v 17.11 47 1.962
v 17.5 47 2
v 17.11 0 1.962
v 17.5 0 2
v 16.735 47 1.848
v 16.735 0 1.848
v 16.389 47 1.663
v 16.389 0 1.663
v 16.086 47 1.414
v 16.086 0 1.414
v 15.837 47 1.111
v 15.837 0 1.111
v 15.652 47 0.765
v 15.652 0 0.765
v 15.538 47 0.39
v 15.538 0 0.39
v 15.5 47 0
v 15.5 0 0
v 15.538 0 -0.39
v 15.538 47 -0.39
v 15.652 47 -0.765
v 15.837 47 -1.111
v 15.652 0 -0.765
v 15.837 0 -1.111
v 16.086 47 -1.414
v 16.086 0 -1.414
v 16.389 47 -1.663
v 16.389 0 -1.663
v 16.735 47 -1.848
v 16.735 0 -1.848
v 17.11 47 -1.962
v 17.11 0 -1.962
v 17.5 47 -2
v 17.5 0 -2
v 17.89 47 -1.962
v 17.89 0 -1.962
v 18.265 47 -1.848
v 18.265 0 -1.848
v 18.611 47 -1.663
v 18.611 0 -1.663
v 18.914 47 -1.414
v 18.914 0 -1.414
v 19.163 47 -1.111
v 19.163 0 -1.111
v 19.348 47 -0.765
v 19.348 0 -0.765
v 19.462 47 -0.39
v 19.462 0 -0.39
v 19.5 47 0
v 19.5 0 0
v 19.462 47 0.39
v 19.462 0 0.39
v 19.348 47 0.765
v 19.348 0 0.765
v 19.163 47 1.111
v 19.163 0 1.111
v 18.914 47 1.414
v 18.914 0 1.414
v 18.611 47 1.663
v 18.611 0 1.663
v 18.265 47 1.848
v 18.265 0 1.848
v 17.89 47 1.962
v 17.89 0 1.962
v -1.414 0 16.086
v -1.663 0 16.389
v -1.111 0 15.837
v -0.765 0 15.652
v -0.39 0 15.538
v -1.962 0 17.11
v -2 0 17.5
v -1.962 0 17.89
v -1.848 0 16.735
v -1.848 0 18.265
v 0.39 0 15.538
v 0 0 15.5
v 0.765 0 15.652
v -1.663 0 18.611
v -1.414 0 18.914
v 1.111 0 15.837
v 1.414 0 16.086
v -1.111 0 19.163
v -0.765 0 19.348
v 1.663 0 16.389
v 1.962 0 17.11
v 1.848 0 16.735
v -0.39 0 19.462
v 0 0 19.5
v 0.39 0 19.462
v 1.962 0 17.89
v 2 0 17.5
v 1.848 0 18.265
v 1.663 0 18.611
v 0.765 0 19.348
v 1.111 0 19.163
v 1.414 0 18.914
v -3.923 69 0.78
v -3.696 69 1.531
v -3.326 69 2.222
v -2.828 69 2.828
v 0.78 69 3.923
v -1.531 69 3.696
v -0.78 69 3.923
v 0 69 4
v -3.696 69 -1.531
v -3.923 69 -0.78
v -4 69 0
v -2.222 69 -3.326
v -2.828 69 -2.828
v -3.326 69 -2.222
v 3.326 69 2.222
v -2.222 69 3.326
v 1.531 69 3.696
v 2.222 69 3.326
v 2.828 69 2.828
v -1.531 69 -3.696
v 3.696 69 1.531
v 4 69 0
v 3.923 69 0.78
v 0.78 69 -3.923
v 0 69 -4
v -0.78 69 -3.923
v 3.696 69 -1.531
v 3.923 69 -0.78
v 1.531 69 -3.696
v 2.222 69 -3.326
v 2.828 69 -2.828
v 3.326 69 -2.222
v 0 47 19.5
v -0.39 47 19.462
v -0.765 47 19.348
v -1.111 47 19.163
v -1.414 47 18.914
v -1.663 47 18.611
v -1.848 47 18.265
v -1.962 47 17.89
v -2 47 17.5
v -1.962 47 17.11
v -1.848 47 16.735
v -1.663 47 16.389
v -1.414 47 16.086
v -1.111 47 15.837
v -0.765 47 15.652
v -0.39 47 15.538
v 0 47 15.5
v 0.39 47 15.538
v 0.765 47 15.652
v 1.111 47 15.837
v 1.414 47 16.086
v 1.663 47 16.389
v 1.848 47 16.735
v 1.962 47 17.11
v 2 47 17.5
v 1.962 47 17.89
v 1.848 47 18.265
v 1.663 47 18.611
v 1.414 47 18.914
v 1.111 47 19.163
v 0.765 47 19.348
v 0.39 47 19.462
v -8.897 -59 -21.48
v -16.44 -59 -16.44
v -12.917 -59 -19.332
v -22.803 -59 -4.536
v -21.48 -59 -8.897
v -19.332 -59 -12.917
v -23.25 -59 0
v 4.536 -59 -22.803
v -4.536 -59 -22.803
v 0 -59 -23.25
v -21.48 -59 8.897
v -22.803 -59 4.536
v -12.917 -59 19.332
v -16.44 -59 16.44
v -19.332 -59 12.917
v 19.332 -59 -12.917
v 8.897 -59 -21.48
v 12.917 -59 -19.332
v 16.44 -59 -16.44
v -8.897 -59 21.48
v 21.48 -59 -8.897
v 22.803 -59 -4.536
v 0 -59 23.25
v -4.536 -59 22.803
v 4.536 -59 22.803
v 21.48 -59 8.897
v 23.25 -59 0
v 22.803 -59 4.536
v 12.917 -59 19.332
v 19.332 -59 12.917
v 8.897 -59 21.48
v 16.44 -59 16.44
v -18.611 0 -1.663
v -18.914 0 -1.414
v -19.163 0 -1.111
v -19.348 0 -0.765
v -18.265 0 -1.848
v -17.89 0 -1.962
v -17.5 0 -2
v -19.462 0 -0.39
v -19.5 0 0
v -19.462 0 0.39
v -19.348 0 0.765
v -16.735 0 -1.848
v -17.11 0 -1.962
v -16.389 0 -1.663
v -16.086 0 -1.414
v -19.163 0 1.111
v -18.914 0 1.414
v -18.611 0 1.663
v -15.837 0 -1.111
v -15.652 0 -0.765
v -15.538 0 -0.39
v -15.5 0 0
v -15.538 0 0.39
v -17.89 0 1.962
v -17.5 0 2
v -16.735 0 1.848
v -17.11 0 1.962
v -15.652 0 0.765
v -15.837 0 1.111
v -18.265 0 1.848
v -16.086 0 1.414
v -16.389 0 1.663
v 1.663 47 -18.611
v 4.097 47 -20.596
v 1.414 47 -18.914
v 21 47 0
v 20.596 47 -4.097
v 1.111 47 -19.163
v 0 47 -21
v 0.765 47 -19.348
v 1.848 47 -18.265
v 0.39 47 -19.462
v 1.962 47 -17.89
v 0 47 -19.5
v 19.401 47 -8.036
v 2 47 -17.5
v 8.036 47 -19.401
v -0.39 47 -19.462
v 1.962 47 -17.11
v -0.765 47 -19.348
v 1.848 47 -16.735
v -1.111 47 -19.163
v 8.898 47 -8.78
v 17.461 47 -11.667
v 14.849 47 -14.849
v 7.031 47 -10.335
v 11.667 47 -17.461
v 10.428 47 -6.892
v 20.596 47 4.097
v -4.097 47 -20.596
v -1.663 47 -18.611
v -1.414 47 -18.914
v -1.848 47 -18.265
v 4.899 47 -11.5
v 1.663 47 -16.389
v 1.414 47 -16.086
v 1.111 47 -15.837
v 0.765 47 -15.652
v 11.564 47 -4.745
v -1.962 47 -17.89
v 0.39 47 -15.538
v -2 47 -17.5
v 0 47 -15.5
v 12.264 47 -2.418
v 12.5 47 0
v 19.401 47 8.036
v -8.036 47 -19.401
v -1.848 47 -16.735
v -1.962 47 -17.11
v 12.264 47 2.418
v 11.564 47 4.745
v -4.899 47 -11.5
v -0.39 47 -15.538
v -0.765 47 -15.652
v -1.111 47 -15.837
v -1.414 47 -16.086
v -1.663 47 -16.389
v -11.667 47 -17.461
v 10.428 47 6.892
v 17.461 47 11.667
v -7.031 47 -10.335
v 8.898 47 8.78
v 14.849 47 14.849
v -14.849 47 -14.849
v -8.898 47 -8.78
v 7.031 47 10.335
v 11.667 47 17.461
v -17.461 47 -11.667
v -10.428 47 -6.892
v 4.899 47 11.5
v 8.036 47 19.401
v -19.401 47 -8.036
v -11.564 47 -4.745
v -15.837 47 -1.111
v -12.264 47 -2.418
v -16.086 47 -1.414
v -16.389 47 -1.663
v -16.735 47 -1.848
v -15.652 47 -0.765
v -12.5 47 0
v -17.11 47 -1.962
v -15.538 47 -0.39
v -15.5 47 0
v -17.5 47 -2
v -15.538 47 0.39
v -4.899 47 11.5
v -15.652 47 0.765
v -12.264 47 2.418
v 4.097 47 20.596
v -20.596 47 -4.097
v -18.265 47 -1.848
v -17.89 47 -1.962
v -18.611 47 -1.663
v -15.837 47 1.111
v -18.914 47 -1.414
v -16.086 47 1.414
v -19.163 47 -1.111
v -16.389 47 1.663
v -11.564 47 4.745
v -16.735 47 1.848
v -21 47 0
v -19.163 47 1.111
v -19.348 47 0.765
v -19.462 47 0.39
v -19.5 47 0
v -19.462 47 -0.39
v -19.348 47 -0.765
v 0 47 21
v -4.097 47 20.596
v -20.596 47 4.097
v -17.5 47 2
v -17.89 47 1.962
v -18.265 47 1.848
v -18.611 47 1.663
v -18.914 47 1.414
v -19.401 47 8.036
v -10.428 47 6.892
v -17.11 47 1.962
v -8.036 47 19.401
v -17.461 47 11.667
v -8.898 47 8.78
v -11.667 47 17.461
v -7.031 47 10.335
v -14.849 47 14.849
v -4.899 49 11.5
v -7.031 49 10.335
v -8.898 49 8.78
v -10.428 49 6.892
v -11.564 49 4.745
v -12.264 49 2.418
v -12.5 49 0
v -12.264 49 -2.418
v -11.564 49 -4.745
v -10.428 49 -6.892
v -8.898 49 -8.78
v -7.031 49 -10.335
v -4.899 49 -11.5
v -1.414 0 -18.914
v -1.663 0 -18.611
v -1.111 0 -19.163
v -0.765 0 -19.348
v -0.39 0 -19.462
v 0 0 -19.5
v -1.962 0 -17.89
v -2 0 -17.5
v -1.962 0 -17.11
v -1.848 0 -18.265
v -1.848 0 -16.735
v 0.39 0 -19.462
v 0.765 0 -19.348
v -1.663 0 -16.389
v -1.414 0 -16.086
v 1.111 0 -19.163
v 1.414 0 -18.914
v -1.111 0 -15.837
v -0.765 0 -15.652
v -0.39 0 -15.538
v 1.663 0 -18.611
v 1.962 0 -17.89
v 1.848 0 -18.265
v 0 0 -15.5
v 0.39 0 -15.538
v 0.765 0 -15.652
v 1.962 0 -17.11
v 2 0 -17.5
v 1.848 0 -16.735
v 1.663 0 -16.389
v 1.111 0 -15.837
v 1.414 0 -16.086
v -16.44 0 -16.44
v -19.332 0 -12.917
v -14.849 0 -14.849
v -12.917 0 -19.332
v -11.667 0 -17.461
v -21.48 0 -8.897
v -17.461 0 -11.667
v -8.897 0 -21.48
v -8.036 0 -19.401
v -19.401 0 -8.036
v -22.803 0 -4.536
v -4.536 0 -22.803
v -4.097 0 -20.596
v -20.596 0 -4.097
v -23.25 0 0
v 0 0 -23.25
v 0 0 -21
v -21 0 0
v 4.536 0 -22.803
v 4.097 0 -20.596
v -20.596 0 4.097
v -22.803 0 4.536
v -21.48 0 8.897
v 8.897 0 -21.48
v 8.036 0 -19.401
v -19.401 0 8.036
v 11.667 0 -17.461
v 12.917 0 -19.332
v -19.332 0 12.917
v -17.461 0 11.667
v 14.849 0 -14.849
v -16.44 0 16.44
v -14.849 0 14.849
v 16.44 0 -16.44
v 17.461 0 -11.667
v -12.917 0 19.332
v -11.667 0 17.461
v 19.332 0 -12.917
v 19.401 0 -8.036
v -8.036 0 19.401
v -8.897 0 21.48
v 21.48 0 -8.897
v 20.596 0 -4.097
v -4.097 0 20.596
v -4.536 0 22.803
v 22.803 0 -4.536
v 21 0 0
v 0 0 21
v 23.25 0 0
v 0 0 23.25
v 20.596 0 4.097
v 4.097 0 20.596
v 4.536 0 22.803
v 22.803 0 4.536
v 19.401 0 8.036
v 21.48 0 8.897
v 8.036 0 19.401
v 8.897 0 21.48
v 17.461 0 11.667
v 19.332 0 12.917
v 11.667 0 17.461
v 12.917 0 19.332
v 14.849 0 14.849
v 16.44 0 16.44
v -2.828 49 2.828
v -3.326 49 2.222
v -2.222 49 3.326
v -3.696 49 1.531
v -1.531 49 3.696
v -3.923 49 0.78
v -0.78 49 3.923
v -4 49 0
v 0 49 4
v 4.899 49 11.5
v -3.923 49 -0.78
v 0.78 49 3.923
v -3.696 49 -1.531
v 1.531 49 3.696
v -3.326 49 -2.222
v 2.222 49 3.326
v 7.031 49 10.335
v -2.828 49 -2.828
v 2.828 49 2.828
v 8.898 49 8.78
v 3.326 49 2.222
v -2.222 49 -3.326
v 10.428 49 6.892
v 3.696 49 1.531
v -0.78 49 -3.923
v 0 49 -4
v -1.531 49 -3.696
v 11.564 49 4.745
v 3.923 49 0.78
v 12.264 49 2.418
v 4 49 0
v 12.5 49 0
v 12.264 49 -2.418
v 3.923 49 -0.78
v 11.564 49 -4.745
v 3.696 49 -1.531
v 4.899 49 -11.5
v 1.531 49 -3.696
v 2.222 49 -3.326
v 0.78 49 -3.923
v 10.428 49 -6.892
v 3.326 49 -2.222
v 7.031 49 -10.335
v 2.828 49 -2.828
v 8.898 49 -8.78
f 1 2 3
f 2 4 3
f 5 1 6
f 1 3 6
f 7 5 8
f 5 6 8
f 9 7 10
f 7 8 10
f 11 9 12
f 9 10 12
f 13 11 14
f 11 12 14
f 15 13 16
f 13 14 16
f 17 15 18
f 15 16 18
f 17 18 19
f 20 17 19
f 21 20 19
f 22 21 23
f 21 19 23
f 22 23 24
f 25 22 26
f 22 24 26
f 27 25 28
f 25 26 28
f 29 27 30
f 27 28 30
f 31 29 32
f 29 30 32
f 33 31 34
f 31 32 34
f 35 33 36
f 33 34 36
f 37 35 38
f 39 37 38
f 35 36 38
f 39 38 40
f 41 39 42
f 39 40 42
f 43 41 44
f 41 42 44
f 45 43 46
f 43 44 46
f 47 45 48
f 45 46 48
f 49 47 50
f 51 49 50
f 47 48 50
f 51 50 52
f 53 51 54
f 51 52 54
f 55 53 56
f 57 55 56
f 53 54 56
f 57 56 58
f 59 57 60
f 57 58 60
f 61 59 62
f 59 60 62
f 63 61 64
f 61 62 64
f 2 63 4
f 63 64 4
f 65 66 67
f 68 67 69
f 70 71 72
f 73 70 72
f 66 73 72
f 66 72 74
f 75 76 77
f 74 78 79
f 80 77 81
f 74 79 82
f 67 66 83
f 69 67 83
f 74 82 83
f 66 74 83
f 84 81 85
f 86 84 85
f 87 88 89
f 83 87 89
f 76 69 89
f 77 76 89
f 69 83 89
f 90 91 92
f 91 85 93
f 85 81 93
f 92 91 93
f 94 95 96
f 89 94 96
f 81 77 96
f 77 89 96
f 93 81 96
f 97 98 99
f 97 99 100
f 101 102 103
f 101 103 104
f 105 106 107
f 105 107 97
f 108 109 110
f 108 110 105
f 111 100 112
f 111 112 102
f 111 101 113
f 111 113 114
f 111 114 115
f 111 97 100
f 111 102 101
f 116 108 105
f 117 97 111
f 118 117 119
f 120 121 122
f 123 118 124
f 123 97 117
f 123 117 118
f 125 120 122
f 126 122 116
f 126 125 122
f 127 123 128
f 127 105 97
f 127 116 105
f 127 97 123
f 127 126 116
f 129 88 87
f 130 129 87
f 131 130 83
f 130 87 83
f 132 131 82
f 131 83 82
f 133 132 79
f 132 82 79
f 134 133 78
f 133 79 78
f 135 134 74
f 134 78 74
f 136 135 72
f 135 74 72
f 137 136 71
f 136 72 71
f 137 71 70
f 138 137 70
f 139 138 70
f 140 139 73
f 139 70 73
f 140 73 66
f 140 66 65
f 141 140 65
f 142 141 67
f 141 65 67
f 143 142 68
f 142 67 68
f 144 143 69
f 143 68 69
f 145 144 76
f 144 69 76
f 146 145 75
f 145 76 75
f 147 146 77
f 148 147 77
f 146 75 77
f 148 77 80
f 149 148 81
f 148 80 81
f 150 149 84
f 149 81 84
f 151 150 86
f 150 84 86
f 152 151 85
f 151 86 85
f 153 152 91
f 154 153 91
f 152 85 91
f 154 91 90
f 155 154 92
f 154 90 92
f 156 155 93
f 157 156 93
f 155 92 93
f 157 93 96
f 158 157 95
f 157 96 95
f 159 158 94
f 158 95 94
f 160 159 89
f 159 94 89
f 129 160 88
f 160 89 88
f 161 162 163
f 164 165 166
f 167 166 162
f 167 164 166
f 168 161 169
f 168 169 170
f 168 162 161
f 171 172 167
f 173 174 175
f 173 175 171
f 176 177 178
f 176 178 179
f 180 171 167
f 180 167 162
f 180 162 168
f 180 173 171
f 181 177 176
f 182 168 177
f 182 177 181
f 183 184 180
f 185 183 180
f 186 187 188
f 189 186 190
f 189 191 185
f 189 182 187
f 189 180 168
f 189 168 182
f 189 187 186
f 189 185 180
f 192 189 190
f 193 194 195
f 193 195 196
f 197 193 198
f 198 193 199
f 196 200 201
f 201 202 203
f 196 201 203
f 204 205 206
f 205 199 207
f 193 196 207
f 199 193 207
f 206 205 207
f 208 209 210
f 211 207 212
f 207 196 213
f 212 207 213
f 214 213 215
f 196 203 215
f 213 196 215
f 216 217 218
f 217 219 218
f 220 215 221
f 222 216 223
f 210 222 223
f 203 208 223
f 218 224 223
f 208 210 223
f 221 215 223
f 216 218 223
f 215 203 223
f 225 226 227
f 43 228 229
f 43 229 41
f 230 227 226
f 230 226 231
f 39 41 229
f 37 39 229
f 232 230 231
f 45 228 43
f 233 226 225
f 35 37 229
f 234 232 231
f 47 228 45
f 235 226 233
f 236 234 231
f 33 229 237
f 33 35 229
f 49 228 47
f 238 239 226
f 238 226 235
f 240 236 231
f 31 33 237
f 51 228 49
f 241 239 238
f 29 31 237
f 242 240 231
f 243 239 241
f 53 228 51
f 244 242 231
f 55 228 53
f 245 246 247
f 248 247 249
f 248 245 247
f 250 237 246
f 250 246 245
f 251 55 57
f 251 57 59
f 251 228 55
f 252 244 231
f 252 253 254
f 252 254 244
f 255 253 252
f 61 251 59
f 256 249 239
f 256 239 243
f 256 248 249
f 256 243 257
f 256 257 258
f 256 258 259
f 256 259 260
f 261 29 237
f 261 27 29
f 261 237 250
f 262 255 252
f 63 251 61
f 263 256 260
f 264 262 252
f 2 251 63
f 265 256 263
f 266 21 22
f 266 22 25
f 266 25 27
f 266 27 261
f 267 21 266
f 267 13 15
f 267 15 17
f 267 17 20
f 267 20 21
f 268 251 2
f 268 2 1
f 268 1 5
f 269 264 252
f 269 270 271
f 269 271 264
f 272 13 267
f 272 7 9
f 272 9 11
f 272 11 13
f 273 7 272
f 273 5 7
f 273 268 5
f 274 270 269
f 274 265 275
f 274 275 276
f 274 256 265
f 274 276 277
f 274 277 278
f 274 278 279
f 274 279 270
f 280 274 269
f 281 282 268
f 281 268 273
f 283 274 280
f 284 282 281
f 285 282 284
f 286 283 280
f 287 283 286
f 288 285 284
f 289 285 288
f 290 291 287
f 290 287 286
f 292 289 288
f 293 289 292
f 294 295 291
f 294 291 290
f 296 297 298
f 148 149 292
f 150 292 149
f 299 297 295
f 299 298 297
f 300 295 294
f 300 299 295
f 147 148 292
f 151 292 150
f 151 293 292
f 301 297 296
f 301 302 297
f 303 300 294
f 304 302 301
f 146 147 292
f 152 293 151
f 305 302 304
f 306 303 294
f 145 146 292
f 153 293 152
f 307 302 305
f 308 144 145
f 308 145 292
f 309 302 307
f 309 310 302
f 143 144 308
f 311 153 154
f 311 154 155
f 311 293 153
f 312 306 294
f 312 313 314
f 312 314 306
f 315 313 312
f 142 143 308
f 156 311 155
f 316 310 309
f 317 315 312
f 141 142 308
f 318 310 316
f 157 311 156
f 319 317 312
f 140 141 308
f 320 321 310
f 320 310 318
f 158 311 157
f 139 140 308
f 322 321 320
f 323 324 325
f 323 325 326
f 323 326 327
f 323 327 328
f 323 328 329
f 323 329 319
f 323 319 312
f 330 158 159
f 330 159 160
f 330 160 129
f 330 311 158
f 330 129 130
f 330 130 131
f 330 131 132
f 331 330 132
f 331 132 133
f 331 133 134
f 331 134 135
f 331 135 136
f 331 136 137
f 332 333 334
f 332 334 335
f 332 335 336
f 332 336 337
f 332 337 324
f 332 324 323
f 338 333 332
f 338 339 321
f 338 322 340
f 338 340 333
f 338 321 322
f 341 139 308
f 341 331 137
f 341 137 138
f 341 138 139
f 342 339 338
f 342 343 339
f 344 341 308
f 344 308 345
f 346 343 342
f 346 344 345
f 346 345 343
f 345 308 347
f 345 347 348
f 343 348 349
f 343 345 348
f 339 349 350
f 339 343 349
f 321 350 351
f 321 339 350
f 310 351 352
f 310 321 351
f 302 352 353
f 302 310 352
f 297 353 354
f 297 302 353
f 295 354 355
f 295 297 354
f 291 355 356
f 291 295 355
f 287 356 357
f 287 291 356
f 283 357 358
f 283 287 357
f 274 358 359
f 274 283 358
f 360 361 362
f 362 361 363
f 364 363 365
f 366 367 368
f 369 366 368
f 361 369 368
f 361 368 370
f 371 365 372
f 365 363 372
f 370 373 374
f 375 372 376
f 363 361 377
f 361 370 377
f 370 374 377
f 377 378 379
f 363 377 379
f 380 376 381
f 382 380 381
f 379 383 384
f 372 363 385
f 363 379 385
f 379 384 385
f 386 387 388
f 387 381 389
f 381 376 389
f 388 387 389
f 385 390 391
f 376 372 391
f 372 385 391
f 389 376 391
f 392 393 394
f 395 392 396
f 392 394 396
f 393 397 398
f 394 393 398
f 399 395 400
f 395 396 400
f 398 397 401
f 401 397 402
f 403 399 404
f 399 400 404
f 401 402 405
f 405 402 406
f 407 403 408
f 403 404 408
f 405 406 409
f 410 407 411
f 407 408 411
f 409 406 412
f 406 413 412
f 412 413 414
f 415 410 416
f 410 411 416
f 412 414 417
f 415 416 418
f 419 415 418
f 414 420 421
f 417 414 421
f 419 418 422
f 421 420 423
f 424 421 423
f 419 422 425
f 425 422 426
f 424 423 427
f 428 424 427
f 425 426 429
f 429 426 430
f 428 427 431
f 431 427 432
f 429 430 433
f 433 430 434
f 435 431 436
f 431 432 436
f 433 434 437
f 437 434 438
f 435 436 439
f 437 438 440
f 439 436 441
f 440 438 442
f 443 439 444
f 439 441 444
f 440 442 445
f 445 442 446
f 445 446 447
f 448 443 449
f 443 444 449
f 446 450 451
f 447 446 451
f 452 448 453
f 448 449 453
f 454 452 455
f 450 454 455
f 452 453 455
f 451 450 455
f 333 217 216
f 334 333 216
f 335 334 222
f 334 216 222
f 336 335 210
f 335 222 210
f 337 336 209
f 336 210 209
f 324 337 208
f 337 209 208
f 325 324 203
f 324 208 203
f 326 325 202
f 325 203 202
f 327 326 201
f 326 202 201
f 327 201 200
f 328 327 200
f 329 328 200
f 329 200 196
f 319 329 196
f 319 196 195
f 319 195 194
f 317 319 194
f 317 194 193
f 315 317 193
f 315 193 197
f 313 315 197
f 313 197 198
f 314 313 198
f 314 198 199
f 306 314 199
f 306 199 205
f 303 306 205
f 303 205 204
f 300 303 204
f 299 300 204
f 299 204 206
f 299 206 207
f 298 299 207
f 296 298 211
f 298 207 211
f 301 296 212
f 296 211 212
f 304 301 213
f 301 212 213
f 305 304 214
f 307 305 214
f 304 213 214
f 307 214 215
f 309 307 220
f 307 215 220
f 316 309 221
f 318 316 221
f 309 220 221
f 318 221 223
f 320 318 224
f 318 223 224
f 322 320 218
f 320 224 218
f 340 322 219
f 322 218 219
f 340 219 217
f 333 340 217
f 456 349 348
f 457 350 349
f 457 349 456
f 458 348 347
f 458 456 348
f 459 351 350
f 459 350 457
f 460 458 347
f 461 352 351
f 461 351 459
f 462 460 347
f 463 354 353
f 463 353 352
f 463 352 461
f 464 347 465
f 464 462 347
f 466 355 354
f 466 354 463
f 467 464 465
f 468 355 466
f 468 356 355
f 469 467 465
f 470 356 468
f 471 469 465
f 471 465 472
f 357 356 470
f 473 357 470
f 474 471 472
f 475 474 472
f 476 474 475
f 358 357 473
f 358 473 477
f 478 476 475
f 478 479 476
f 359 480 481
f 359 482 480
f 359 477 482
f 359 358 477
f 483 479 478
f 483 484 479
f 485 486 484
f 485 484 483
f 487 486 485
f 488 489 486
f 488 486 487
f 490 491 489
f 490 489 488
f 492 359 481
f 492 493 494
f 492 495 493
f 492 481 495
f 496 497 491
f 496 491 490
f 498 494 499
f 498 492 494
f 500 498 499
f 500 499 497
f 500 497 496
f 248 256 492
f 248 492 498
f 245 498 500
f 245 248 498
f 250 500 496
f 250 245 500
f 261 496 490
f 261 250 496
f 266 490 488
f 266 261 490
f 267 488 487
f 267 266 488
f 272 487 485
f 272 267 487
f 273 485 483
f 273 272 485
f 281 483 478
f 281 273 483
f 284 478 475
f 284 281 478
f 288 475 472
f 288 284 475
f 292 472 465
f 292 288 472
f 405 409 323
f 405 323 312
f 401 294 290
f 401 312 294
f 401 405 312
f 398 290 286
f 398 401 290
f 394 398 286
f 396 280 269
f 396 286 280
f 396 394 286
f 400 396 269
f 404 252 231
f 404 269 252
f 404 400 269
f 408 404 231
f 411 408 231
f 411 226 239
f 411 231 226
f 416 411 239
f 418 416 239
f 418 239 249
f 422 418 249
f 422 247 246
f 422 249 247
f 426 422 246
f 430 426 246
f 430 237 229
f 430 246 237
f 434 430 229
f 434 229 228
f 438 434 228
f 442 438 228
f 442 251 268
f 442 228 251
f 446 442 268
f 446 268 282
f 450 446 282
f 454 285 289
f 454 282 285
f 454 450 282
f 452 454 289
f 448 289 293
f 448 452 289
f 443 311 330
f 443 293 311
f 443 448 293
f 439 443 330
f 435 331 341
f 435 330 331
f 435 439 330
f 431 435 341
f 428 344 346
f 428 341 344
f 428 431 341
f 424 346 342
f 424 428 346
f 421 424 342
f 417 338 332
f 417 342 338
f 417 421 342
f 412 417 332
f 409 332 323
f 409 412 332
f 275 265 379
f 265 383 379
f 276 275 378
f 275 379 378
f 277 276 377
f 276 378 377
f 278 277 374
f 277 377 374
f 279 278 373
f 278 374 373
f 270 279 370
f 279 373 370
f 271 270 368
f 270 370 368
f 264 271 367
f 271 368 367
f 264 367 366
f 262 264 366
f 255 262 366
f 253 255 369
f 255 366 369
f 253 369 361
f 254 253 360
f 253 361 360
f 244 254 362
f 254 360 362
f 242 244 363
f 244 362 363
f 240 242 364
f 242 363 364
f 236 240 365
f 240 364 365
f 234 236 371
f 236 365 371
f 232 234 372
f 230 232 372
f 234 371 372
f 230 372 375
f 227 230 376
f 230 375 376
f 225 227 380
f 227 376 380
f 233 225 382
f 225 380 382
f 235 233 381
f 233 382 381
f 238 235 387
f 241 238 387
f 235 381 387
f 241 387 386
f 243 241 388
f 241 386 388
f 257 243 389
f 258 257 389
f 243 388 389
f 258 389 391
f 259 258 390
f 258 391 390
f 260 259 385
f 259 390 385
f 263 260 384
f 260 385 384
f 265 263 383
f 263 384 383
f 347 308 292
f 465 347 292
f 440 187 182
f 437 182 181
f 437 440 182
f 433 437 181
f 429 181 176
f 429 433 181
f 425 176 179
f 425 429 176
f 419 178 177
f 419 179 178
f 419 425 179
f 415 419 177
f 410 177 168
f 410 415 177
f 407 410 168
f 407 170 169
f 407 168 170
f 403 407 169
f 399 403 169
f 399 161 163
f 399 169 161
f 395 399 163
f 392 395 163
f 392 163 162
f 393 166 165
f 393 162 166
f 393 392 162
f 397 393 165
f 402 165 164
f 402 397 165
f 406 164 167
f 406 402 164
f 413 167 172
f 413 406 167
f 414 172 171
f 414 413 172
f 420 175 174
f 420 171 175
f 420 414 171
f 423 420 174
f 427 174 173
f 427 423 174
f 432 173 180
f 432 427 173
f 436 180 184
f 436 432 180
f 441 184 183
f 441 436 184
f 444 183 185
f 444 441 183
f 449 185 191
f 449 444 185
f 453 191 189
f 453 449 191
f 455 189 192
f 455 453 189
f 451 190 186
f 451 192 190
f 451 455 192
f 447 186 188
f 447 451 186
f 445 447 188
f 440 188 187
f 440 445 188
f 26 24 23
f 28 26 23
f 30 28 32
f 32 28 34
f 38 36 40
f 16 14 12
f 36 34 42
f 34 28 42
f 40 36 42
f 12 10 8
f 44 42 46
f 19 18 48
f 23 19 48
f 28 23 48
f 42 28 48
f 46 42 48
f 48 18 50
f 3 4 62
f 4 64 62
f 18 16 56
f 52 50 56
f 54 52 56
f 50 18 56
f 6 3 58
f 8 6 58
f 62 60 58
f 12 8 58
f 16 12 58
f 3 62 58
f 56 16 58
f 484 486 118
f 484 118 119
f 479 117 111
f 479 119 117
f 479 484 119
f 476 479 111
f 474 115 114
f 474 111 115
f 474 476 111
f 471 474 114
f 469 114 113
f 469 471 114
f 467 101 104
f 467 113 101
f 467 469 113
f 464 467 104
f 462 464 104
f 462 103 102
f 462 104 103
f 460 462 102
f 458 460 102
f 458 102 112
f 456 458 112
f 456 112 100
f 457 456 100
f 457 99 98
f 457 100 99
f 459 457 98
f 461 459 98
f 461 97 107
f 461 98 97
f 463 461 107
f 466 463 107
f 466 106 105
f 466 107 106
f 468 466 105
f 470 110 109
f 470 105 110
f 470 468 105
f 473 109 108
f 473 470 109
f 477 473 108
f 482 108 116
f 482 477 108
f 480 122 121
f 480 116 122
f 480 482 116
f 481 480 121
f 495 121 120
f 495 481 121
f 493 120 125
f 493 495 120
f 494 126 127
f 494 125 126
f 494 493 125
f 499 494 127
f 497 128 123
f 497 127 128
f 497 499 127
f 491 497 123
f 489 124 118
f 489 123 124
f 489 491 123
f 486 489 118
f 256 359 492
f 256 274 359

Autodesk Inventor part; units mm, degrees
ref_plane "YZ Plane" through (0, 0, 0) normal (1, 0, 0) x (0, 1, 0)
ref_plane "XZ Plane" through (0, 0, 0) normal (0, 1, 0) x (-1, 0, 0)
ref_plane "XY Plane" through (0, 0, 0) normal (0, 0, 1) x (1, 0, 0)
sketch "スケッチ1" plane through (0, 0, 0) normal (0, 1, 0) x (-1, 0, 0)
  circle A0 centre (0, 0) radius 21
  dimension "d0" = 42
extrude "押し出し1" add sketch "スケッチ1" along normal blind 47
sketch "スケッチ2" plane through (0, 47, 0) normal (0, 1, 0) x (1, 0, 0)
  line L0 (0, 0) -> (0, 11.5)
  line L1 (0, 11.5) -> (0, -11.5)
  line L2 (-4.899, -11.5) -> (4.899, -11.5)
  line L3 (-4.899, 11.5) -> (4.899, 11.5)
  arc A0 (-4.899, 11.5) -> (-4.899, -11.5) centre (0, 0) ccw
  arc A1 (4.899, -11.5) -> (4.899, 11.5) centre (0, 0) ccw
extrude "押し出し2" add sketch "スケッチ2" along normal blind 2
sketch "スケッチ3" plane through (0, 47, 0) normal (0, 1, 0) x (1, 0, 0)
  circle A0 centre (0, 0) radius 17.5
  point P0 (-17.5, 0)
  point P1 (0, 17.5)
  point P2 (0, -17.5)
  point P3 (17.5, 0)
  dimension "d8" = 35
hole "穴1" at (-17.5, 47, 0) at (0, 47, -17.5) at (0, 47, 17.5) at (17.5, 47, 0) direction (0, -1, 0) diameter 4 end through all
sketch "スケッチ4" plane through (0, 49, 0) normal (0, 1, 0) x (1, 0, 0)
  circle A0 centre (0, 0) radius 4
  dimension "d16" = 8
extrude "押し出し3" add sketch "スケッチ4" along normal blind 20
sketch "スケッチ5" plane through (0, 0, 0) normal (0, -1, 0) x (1, 0, 0)
  circle A0 centre (0, 0) radius 23.25
  dimension "d19" = 46.5
extrude "押し出し4" add sketch "スケッチ5" along normal blind 59
properties part number "IG42-017"
